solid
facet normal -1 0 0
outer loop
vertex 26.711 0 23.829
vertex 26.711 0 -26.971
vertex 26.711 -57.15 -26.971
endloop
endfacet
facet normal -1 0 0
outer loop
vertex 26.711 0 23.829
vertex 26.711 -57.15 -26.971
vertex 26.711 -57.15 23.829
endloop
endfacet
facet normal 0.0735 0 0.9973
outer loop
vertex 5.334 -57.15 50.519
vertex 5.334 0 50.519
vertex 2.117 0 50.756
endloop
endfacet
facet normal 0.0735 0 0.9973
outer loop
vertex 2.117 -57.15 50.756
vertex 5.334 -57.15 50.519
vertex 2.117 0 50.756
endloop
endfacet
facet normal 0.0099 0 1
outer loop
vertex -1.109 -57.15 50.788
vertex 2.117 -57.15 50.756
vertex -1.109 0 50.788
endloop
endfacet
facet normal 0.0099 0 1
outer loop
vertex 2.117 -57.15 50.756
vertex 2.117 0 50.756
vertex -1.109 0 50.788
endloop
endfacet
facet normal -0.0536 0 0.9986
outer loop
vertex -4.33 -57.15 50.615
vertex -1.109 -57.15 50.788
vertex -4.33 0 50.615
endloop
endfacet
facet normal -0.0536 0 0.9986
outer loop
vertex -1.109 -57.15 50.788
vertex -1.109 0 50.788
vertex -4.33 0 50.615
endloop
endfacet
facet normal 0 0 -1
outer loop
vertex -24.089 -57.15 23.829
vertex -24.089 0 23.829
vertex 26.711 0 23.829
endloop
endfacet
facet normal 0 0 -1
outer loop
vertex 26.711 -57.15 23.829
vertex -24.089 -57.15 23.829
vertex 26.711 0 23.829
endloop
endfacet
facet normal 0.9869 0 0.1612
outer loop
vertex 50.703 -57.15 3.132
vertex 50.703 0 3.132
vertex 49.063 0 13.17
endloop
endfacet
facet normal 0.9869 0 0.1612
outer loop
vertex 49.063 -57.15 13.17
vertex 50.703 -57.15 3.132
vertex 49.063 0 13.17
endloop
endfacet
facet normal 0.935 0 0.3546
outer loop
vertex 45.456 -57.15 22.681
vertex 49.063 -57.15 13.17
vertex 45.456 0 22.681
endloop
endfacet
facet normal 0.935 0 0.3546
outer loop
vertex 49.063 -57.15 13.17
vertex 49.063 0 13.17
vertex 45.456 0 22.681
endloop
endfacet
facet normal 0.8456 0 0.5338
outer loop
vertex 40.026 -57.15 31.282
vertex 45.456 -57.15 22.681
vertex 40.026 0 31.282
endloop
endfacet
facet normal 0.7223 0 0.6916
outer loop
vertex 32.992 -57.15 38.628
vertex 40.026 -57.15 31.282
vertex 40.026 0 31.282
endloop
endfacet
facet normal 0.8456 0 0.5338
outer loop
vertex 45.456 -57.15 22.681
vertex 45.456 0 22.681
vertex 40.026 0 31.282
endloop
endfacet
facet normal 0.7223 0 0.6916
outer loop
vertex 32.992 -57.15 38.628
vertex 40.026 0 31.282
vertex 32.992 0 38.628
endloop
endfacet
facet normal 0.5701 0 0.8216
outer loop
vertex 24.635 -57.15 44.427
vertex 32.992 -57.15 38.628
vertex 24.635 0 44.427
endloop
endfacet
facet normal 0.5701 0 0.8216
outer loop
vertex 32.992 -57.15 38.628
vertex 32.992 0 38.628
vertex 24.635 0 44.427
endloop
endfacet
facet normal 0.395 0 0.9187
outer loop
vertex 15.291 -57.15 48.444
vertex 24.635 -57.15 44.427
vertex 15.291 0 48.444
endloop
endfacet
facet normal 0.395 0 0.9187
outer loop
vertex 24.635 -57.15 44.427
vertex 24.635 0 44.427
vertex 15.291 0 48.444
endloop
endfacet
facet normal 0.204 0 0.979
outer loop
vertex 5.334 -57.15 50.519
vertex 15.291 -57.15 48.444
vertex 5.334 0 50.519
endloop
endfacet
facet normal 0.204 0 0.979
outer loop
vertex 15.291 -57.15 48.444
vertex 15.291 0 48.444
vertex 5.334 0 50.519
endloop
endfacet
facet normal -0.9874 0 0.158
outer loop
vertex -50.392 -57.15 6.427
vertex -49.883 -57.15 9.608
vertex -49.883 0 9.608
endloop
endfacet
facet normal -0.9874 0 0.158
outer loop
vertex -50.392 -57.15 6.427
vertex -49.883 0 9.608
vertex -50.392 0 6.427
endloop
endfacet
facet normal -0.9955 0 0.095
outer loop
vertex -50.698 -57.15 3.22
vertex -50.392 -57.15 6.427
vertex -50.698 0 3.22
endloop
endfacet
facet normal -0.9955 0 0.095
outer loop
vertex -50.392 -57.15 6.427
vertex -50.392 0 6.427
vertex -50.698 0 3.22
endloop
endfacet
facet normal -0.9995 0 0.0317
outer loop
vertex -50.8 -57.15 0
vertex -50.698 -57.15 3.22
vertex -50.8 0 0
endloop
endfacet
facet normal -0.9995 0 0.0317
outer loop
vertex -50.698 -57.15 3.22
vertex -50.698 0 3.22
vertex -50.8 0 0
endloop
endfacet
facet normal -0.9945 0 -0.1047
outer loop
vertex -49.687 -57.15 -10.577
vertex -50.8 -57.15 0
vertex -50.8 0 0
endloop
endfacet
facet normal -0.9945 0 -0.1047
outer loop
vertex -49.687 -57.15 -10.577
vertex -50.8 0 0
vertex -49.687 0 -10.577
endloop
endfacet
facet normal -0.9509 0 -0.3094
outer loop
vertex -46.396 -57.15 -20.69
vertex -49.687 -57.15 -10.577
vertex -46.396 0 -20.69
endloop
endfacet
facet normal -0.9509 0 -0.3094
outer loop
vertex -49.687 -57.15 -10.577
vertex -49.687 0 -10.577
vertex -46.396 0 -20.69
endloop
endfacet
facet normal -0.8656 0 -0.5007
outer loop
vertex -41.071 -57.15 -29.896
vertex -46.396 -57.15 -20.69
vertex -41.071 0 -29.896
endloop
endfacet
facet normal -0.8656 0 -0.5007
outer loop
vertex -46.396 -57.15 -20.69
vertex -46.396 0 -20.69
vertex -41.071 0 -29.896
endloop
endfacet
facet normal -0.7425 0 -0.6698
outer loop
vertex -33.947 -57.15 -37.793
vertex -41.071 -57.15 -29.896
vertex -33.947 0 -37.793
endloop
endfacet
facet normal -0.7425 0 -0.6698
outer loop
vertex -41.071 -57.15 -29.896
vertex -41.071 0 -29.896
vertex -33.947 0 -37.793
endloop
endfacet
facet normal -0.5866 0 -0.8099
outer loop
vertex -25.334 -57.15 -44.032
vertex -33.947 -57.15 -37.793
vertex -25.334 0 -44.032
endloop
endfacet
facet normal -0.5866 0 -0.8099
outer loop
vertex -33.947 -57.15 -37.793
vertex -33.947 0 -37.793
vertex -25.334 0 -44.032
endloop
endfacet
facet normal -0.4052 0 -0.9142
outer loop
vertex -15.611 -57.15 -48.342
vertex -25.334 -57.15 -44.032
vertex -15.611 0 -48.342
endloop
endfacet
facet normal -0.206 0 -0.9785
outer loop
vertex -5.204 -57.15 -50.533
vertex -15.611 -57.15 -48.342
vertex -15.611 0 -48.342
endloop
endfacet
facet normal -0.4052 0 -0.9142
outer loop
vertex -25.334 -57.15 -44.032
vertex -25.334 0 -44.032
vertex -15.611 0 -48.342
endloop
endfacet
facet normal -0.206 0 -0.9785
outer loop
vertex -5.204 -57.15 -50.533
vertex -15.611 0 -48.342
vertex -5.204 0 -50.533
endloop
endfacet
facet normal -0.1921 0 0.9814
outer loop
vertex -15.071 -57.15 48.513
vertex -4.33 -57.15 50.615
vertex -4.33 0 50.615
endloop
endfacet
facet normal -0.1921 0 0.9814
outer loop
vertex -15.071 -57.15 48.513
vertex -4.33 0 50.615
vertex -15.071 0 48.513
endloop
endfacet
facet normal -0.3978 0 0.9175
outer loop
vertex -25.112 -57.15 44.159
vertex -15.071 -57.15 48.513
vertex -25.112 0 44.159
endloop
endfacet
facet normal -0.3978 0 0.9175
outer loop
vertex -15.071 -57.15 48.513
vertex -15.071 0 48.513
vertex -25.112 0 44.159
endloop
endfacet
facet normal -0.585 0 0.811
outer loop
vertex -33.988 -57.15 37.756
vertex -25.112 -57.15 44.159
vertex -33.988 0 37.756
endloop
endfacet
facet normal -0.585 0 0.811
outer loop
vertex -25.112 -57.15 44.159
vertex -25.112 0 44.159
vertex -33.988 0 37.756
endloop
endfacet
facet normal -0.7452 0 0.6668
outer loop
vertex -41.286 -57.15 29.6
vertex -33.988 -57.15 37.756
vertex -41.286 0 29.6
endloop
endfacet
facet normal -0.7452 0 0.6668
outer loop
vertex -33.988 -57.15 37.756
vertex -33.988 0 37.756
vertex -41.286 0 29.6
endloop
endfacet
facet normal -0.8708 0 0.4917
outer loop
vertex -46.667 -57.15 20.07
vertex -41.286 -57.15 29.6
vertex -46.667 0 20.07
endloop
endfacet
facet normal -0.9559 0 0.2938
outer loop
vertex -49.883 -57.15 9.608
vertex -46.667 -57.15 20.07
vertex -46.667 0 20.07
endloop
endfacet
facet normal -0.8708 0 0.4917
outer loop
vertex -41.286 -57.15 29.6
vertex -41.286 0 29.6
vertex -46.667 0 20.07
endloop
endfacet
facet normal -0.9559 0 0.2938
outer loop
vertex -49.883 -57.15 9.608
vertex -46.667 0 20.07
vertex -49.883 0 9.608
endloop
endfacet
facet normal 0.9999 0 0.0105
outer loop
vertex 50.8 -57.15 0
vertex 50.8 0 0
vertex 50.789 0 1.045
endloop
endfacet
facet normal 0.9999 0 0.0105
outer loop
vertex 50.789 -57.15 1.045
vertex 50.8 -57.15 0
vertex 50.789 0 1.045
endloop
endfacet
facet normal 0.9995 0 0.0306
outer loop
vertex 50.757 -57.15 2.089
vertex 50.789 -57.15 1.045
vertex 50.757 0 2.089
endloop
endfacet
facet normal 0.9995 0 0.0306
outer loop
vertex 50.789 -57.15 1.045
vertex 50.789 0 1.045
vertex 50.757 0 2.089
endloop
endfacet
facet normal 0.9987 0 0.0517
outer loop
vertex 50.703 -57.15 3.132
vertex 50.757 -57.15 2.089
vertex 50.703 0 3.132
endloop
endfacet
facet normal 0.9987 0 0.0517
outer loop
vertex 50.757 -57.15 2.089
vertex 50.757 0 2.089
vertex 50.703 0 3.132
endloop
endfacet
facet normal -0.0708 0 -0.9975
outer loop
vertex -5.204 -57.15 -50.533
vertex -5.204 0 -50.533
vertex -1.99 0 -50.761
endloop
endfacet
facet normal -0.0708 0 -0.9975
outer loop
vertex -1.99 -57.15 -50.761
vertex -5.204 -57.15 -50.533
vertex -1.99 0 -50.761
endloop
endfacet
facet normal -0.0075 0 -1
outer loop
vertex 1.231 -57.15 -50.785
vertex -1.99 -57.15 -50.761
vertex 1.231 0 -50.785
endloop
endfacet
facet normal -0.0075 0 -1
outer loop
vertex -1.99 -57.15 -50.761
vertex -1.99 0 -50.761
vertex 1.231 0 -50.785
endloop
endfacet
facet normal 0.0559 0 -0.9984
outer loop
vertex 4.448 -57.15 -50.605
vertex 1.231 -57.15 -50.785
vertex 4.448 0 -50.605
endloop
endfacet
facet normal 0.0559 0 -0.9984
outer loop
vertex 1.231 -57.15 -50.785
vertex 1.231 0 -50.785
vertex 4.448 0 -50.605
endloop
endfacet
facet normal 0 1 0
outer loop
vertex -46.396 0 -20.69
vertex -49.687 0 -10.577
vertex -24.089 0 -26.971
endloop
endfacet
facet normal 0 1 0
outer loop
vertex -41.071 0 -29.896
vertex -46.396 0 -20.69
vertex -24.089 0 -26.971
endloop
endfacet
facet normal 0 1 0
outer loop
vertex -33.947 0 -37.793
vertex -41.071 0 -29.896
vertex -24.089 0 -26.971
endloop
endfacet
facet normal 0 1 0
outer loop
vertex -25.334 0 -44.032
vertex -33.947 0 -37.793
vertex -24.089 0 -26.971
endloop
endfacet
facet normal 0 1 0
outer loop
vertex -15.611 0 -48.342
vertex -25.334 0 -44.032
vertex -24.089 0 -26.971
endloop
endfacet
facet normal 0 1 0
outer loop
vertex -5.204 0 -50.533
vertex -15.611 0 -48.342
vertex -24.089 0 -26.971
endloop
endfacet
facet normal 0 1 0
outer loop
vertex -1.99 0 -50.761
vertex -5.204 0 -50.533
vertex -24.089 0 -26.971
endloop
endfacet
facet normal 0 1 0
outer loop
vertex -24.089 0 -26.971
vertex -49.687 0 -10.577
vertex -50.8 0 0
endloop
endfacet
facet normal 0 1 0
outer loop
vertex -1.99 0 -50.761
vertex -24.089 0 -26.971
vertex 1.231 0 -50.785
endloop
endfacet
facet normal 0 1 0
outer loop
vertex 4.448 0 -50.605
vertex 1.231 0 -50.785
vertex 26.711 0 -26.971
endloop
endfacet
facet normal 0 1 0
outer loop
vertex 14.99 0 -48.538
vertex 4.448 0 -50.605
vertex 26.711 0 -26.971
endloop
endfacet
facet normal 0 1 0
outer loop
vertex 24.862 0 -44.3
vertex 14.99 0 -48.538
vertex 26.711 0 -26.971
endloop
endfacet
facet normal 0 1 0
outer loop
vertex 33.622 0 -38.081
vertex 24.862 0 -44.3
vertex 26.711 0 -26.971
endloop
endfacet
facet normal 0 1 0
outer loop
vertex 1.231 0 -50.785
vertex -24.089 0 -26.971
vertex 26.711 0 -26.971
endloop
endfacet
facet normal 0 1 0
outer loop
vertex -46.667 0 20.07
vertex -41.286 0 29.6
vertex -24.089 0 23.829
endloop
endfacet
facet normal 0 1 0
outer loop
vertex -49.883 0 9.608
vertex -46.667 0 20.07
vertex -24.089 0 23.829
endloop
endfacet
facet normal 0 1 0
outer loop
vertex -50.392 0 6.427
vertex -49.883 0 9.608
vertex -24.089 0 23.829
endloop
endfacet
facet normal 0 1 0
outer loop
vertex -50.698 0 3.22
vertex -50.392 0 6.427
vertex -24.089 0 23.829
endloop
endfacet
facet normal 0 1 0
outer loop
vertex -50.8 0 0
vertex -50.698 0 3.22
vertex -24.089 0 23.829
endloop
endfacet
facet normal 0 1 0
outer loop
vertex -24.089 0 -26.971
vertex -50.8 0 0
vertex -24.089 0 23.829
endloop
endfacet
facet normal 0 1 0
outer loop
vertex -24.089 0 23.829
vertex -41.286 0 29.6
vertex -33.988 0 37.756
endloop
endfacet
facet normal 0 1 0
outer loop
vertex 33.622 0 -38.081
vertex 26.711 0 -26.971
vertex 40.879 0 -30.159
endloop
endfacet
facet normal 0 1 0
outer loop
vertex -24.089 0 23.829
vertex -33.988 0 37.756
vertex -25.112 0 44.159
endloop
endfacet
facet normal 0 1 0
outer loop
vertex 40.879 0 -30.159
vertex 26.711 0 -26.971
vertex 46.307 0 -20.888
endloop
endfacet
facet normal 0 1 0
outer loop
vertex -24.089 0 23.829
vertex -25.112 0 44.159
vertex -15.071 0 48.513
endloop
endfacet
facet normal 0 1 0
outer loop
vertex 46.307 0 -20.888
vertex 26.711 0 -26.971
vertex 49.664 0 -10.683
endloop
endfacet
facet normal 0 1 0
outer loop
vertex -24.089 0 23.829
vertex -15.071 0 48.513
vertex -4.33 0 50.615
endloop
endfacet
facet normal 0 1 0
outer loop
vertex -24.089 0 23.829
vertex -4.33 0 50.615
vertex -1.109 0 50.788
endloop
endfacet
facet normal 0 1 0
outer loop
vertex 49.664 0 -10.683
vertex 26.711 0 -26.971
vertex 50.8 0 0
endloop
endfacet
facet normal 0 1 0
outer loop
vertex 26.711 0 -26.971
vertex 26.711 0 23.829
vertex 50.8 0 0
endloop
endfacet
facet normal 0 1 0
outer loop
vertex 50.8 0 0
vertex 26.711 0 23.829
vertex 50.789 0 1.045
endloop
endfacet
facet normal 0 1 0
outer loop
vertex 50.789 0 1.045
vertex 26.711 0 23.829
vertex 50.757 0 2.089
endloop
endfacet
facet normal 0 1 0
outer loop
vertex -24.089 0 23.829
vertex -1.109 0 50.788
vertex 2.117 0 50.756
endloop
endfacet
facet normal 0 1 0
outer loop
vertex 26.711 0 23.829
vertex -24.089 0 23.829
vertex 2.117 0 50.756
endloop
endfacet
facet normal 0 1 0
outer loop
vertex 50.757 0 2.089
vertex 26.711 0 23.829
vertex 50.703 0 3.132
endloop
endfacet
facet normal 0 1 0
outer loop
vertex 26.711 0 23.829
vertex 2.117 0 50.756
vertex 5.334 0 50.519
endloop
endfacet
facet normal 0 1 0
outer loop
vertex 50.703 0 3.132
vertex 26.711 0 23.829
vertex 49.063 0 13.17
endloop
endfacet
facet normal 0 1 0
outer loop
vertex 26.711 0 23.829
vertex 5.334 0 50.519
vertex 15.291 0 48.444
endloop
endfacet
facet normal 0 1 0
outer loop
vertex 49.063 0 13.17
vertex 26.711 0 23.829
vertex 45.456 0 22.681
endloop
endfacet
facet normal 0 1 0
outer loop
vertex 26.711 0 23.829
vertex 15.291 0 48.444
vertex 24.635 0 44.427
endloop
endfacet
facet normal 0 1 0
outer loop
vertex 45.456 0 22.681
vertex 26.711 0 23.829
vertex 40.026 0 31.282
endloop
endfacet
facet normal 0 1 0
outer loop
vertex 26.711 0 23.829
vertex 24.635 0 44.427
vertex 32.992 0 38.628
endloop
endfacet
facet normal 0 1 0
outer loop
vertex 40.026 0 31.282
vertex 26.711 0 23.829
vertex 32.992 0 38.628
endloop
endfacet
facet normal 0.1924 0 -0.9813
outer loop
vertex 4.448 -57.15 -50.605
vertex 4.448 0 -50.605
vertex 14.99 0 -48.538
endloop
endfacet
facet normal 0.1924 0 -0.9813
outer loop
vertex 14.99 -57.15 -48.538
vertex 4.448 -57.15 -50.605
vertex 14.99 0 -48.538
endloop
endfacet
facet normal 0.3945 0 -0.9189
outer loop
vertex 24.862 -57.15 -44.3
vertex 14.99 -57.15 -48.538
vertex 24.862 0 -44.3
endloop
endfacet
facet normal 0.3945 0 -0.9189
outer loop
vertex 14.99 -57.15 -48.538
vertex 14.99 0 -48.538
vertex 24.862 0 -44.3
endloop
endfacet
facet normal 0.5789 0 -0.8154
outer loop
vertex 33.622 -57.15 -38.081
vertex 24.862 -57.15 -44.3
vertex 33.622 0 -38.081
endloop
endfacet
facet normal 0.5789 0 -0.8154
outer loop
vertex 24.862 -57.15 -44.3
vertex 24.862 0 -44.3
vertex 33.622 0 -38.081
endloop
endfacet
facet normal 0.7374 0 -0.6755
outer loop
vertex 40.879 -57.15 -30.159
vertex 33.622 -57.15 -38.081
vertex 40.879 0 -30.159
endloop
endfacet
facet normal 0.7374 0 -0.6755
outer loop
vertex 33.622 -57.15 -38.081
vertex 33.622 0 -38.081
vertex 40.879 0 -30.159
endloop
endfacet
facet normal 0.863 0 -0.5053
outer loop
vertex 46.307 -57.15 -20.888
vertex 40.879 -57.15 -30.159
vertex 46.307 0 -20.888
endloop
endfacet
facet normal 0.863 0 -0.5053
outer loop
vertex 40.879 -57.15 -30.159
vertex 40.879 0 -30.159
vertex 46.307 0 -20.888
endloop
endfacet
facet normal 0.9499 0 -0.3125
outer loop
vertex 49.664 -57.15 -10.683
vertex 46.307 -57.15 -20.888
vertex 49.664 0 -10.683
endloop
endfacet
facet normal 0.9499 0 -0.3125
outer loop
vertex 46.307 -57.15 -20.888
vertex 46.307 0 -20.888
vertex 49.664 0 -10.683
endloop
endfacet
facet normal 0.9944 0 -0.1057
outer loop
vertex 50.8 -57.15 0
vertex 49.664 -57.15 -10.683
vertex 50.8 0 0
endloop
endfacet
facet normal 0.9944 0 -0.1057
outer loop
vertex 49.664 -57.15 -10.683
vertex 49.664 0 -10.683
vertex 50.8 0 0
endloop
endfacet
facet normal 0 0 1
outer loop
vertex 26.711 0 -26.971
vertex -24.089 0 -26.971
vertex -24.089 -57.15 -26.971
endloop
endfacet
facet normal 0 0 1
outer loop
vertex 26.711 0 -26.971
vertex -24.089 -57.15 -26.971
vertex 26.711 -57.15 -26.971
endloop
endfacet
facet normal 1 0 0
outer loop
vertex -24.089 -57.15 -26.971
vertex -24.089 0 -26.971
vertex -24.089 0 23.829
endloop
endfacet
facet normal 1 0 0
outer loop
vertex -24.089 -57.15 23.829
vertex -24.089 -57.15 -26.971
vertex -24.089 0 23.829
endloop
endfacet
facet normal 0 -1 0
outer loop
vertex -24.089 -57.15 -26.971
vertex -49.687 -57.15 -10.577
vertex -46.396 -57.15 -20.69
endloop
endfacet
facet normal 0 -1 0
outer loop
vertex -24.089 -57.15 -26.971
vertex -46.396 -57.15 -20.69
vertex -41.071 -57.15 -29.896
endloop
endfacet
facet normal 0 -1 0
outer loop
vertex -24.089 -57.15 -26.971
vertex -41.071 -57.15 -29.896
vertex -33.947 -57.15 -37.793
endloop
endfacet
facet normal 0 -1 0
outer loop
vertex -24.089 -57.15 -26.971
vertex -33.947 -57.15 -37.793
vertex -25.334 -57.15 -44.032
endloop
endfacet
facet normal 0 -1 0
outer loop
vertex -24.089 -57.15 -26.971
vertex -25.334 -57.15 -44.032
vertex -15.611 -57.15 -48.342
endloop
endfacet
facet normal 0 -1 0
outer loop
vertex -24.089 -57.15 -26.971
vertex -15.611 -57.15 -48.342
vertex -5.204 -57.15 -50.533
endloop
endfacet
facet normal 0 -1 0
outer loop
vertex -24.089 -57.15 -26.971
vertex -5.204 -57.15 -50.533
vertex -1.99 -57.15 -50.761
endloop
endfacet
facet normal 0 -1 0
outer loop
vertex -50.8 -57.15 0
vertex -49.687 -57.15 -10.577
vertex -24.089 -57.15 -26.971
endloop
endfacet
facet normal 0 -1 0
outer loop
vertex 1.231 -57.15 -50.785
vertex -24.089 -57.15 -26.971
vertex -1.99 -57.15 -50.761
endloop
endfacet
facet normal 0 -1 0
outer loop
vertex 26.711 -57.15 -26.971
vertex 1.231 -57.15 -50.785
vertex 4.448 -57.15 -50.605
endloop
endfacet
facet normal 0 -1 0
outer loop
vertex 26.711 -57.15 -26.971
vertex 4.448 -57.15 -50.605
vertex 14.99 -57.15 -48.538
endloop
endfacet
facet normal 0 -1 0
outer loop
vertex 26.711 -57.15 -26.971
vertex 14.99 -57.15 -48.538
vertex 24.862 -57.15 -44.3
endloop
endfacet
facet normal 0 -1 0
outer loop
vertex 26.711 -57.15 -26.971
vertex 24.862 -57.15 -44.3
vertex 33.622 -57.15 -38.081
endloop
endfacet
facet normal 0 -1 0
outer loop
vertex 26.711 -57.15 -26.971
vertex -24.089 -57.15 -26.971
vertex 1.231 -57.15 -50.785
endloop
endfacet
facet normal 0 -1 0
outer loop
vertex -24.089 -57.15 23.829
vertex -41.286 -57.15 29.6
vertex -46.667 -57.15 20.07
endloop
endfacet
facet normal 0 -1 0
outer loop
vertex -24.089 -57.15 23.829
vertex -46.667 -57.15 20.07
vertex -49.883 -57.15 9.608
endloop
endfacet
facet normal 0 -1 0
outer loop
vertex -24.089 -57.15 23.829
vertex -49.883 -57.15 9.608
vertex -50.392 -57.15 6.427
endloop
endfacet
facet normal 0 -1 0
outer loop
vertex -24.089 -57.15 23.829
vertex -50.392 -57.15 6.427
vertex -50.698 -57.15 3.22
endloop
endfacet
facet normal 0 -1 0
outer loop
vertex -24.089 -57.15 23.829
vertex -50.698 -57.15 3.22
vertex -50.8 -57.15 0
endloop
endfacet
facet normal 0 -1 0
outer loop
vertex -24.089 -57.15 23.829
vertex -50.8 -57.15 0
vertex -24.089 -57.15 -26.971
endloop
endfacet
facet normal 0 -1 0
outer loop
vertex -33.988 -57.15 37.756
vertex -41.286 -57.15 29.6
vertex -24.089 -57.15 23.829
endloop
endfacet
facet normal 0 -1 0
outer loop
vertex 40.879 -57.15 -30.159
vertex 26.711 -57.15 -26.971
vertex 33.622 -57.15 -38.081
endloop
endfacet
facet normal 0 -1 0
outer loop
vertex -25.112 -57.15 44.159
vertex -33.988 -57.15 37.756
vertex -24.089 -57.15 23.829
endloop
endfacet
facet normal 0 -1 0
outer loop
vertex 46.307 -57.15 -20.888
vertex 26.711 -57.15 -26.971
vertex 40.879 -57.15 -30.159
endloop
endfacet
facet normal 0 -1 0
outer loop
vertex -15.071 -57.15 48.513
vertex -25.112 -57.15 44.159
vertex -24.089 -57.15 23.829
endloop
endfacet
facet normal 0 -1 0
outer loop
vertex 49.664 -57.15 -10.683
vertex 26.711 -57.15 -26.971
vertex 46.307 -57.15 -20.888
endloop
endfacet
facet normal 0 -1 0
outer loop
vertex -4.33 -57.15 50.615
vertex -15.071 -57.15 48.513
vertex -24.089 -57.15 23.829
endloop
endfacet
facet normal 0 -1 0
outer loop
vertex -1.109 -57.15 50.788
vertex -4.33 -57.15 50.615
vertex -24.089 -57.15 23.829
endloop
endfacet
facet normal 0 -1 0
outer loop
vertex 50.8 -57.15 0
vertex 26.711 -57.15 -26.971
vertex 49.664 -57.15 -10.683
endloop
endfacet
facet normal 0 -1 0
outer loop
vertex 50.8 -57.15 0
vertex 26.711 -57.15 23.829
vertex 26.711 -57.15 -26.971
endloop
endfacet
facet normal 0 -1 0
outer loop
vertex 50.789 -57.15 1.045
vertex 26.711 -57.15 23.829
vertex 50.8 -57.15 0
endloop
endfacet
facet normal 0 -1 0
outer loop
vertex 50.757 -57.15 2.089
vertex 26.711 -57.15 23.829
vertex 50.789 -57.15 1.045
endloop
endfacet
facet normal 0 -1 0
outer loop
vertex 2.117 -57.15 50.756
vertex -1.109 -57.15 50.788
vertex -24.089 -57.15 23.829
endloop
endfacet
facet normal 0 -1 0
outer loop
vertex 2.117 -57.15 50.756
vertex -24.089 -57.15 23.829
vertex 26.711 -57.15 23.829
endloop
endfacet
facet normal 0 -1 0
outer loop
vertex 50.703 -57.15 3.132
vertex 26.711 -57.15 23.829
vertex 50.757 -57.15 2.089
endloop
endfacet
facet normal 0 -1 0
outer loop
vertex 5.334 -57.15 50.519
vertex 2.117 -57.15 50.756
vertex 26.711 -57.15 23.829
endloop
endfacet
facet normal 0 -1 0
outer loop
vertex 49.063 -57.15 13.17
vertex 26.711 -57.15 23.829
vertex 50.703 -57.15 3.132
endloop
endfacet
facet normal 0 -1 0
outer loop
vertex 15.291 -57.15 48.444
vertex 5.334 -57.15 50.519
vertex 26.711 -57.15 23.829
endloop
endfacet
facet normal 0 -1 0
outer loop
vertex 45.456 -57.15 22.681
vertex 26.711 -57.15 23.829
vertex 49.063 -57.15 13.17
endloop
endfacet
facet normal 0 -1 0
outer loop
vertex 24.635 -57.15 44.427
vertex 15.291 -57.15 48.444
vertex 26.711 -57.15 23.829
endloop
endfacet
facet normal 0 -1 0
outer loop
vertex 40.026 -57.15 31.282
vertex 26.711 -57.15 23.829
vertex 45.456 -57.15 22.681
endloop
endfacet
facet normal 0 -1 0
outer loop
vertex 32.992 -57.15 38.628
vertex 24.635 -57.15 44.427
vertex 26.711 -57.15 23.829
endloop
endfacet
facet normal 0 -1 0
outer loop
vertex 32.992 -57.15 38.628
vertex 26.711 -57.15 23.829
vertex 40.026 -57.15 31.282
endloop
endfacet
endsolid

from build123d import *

# Parameters (mm, degrees)
F0_R     = 45.8082215722
F0_W     = 50.8
F0_H     = 50.8
F1_DEPTH = 57.15


with BuildPart() as f1:
    # F0 (on Front) → F1 (new body)
    with BuildSketch(Plane.XZ):
        with BuildLine():
            ThreePointArc((50.3805792284, -6.5143868947), (50.6950363685, -3.263937438), (50.8, 0))
            ThreePointArc((50.8, 0), (50.7758305884, 1.5668529167), (50.7033453519, 3.132214892))
            ThreePointArc((50.7033453519, 3.132214892), (36.6935912077, 35.1314725606), (5.3336979084, 50.5192207642))
            ThreePointArc((5.3336979084, 50.5192207642), (0.5040836669, 50.7974989508), (-4.3301018727, 50.6151184704))
            ThreePointArc((-4.3301018727, 50.6151184704), (-33.9875795574, 37.7555881404), (-49.88306, 9.6083466339))
            ThreePointArc((-49.88306, 9.6083466339), (-50.5702454414, 4.826), (-50.8, 0))
            ThreePointArc((-50.8, 0), (-37.7160446944, -34.0314556346), (-5.2039380863, -50.5327520366))
            ThreePointArc((-5.2039380863, -50.5327520366), (-0.3797906487, -50.7985802859), (4.4477921681, -50.6049122599))
            ThreePointArc((4.4477921681, -50.6049122599), (35.1785614294, -36.6484490225), (50.3805792284, -6.5143868947))
        make_face()
        Circle(F0_R, mode=Mode.SUBTRACT)
        Circle(F0_R)
        with Locations((1.3111739695, -1.5712582231)):
            Rectangle(F0_W, F0_H, mode=Mode.SUBTRACT)
    extrude(amount=F1_DEPTH)


solid = f1.part
